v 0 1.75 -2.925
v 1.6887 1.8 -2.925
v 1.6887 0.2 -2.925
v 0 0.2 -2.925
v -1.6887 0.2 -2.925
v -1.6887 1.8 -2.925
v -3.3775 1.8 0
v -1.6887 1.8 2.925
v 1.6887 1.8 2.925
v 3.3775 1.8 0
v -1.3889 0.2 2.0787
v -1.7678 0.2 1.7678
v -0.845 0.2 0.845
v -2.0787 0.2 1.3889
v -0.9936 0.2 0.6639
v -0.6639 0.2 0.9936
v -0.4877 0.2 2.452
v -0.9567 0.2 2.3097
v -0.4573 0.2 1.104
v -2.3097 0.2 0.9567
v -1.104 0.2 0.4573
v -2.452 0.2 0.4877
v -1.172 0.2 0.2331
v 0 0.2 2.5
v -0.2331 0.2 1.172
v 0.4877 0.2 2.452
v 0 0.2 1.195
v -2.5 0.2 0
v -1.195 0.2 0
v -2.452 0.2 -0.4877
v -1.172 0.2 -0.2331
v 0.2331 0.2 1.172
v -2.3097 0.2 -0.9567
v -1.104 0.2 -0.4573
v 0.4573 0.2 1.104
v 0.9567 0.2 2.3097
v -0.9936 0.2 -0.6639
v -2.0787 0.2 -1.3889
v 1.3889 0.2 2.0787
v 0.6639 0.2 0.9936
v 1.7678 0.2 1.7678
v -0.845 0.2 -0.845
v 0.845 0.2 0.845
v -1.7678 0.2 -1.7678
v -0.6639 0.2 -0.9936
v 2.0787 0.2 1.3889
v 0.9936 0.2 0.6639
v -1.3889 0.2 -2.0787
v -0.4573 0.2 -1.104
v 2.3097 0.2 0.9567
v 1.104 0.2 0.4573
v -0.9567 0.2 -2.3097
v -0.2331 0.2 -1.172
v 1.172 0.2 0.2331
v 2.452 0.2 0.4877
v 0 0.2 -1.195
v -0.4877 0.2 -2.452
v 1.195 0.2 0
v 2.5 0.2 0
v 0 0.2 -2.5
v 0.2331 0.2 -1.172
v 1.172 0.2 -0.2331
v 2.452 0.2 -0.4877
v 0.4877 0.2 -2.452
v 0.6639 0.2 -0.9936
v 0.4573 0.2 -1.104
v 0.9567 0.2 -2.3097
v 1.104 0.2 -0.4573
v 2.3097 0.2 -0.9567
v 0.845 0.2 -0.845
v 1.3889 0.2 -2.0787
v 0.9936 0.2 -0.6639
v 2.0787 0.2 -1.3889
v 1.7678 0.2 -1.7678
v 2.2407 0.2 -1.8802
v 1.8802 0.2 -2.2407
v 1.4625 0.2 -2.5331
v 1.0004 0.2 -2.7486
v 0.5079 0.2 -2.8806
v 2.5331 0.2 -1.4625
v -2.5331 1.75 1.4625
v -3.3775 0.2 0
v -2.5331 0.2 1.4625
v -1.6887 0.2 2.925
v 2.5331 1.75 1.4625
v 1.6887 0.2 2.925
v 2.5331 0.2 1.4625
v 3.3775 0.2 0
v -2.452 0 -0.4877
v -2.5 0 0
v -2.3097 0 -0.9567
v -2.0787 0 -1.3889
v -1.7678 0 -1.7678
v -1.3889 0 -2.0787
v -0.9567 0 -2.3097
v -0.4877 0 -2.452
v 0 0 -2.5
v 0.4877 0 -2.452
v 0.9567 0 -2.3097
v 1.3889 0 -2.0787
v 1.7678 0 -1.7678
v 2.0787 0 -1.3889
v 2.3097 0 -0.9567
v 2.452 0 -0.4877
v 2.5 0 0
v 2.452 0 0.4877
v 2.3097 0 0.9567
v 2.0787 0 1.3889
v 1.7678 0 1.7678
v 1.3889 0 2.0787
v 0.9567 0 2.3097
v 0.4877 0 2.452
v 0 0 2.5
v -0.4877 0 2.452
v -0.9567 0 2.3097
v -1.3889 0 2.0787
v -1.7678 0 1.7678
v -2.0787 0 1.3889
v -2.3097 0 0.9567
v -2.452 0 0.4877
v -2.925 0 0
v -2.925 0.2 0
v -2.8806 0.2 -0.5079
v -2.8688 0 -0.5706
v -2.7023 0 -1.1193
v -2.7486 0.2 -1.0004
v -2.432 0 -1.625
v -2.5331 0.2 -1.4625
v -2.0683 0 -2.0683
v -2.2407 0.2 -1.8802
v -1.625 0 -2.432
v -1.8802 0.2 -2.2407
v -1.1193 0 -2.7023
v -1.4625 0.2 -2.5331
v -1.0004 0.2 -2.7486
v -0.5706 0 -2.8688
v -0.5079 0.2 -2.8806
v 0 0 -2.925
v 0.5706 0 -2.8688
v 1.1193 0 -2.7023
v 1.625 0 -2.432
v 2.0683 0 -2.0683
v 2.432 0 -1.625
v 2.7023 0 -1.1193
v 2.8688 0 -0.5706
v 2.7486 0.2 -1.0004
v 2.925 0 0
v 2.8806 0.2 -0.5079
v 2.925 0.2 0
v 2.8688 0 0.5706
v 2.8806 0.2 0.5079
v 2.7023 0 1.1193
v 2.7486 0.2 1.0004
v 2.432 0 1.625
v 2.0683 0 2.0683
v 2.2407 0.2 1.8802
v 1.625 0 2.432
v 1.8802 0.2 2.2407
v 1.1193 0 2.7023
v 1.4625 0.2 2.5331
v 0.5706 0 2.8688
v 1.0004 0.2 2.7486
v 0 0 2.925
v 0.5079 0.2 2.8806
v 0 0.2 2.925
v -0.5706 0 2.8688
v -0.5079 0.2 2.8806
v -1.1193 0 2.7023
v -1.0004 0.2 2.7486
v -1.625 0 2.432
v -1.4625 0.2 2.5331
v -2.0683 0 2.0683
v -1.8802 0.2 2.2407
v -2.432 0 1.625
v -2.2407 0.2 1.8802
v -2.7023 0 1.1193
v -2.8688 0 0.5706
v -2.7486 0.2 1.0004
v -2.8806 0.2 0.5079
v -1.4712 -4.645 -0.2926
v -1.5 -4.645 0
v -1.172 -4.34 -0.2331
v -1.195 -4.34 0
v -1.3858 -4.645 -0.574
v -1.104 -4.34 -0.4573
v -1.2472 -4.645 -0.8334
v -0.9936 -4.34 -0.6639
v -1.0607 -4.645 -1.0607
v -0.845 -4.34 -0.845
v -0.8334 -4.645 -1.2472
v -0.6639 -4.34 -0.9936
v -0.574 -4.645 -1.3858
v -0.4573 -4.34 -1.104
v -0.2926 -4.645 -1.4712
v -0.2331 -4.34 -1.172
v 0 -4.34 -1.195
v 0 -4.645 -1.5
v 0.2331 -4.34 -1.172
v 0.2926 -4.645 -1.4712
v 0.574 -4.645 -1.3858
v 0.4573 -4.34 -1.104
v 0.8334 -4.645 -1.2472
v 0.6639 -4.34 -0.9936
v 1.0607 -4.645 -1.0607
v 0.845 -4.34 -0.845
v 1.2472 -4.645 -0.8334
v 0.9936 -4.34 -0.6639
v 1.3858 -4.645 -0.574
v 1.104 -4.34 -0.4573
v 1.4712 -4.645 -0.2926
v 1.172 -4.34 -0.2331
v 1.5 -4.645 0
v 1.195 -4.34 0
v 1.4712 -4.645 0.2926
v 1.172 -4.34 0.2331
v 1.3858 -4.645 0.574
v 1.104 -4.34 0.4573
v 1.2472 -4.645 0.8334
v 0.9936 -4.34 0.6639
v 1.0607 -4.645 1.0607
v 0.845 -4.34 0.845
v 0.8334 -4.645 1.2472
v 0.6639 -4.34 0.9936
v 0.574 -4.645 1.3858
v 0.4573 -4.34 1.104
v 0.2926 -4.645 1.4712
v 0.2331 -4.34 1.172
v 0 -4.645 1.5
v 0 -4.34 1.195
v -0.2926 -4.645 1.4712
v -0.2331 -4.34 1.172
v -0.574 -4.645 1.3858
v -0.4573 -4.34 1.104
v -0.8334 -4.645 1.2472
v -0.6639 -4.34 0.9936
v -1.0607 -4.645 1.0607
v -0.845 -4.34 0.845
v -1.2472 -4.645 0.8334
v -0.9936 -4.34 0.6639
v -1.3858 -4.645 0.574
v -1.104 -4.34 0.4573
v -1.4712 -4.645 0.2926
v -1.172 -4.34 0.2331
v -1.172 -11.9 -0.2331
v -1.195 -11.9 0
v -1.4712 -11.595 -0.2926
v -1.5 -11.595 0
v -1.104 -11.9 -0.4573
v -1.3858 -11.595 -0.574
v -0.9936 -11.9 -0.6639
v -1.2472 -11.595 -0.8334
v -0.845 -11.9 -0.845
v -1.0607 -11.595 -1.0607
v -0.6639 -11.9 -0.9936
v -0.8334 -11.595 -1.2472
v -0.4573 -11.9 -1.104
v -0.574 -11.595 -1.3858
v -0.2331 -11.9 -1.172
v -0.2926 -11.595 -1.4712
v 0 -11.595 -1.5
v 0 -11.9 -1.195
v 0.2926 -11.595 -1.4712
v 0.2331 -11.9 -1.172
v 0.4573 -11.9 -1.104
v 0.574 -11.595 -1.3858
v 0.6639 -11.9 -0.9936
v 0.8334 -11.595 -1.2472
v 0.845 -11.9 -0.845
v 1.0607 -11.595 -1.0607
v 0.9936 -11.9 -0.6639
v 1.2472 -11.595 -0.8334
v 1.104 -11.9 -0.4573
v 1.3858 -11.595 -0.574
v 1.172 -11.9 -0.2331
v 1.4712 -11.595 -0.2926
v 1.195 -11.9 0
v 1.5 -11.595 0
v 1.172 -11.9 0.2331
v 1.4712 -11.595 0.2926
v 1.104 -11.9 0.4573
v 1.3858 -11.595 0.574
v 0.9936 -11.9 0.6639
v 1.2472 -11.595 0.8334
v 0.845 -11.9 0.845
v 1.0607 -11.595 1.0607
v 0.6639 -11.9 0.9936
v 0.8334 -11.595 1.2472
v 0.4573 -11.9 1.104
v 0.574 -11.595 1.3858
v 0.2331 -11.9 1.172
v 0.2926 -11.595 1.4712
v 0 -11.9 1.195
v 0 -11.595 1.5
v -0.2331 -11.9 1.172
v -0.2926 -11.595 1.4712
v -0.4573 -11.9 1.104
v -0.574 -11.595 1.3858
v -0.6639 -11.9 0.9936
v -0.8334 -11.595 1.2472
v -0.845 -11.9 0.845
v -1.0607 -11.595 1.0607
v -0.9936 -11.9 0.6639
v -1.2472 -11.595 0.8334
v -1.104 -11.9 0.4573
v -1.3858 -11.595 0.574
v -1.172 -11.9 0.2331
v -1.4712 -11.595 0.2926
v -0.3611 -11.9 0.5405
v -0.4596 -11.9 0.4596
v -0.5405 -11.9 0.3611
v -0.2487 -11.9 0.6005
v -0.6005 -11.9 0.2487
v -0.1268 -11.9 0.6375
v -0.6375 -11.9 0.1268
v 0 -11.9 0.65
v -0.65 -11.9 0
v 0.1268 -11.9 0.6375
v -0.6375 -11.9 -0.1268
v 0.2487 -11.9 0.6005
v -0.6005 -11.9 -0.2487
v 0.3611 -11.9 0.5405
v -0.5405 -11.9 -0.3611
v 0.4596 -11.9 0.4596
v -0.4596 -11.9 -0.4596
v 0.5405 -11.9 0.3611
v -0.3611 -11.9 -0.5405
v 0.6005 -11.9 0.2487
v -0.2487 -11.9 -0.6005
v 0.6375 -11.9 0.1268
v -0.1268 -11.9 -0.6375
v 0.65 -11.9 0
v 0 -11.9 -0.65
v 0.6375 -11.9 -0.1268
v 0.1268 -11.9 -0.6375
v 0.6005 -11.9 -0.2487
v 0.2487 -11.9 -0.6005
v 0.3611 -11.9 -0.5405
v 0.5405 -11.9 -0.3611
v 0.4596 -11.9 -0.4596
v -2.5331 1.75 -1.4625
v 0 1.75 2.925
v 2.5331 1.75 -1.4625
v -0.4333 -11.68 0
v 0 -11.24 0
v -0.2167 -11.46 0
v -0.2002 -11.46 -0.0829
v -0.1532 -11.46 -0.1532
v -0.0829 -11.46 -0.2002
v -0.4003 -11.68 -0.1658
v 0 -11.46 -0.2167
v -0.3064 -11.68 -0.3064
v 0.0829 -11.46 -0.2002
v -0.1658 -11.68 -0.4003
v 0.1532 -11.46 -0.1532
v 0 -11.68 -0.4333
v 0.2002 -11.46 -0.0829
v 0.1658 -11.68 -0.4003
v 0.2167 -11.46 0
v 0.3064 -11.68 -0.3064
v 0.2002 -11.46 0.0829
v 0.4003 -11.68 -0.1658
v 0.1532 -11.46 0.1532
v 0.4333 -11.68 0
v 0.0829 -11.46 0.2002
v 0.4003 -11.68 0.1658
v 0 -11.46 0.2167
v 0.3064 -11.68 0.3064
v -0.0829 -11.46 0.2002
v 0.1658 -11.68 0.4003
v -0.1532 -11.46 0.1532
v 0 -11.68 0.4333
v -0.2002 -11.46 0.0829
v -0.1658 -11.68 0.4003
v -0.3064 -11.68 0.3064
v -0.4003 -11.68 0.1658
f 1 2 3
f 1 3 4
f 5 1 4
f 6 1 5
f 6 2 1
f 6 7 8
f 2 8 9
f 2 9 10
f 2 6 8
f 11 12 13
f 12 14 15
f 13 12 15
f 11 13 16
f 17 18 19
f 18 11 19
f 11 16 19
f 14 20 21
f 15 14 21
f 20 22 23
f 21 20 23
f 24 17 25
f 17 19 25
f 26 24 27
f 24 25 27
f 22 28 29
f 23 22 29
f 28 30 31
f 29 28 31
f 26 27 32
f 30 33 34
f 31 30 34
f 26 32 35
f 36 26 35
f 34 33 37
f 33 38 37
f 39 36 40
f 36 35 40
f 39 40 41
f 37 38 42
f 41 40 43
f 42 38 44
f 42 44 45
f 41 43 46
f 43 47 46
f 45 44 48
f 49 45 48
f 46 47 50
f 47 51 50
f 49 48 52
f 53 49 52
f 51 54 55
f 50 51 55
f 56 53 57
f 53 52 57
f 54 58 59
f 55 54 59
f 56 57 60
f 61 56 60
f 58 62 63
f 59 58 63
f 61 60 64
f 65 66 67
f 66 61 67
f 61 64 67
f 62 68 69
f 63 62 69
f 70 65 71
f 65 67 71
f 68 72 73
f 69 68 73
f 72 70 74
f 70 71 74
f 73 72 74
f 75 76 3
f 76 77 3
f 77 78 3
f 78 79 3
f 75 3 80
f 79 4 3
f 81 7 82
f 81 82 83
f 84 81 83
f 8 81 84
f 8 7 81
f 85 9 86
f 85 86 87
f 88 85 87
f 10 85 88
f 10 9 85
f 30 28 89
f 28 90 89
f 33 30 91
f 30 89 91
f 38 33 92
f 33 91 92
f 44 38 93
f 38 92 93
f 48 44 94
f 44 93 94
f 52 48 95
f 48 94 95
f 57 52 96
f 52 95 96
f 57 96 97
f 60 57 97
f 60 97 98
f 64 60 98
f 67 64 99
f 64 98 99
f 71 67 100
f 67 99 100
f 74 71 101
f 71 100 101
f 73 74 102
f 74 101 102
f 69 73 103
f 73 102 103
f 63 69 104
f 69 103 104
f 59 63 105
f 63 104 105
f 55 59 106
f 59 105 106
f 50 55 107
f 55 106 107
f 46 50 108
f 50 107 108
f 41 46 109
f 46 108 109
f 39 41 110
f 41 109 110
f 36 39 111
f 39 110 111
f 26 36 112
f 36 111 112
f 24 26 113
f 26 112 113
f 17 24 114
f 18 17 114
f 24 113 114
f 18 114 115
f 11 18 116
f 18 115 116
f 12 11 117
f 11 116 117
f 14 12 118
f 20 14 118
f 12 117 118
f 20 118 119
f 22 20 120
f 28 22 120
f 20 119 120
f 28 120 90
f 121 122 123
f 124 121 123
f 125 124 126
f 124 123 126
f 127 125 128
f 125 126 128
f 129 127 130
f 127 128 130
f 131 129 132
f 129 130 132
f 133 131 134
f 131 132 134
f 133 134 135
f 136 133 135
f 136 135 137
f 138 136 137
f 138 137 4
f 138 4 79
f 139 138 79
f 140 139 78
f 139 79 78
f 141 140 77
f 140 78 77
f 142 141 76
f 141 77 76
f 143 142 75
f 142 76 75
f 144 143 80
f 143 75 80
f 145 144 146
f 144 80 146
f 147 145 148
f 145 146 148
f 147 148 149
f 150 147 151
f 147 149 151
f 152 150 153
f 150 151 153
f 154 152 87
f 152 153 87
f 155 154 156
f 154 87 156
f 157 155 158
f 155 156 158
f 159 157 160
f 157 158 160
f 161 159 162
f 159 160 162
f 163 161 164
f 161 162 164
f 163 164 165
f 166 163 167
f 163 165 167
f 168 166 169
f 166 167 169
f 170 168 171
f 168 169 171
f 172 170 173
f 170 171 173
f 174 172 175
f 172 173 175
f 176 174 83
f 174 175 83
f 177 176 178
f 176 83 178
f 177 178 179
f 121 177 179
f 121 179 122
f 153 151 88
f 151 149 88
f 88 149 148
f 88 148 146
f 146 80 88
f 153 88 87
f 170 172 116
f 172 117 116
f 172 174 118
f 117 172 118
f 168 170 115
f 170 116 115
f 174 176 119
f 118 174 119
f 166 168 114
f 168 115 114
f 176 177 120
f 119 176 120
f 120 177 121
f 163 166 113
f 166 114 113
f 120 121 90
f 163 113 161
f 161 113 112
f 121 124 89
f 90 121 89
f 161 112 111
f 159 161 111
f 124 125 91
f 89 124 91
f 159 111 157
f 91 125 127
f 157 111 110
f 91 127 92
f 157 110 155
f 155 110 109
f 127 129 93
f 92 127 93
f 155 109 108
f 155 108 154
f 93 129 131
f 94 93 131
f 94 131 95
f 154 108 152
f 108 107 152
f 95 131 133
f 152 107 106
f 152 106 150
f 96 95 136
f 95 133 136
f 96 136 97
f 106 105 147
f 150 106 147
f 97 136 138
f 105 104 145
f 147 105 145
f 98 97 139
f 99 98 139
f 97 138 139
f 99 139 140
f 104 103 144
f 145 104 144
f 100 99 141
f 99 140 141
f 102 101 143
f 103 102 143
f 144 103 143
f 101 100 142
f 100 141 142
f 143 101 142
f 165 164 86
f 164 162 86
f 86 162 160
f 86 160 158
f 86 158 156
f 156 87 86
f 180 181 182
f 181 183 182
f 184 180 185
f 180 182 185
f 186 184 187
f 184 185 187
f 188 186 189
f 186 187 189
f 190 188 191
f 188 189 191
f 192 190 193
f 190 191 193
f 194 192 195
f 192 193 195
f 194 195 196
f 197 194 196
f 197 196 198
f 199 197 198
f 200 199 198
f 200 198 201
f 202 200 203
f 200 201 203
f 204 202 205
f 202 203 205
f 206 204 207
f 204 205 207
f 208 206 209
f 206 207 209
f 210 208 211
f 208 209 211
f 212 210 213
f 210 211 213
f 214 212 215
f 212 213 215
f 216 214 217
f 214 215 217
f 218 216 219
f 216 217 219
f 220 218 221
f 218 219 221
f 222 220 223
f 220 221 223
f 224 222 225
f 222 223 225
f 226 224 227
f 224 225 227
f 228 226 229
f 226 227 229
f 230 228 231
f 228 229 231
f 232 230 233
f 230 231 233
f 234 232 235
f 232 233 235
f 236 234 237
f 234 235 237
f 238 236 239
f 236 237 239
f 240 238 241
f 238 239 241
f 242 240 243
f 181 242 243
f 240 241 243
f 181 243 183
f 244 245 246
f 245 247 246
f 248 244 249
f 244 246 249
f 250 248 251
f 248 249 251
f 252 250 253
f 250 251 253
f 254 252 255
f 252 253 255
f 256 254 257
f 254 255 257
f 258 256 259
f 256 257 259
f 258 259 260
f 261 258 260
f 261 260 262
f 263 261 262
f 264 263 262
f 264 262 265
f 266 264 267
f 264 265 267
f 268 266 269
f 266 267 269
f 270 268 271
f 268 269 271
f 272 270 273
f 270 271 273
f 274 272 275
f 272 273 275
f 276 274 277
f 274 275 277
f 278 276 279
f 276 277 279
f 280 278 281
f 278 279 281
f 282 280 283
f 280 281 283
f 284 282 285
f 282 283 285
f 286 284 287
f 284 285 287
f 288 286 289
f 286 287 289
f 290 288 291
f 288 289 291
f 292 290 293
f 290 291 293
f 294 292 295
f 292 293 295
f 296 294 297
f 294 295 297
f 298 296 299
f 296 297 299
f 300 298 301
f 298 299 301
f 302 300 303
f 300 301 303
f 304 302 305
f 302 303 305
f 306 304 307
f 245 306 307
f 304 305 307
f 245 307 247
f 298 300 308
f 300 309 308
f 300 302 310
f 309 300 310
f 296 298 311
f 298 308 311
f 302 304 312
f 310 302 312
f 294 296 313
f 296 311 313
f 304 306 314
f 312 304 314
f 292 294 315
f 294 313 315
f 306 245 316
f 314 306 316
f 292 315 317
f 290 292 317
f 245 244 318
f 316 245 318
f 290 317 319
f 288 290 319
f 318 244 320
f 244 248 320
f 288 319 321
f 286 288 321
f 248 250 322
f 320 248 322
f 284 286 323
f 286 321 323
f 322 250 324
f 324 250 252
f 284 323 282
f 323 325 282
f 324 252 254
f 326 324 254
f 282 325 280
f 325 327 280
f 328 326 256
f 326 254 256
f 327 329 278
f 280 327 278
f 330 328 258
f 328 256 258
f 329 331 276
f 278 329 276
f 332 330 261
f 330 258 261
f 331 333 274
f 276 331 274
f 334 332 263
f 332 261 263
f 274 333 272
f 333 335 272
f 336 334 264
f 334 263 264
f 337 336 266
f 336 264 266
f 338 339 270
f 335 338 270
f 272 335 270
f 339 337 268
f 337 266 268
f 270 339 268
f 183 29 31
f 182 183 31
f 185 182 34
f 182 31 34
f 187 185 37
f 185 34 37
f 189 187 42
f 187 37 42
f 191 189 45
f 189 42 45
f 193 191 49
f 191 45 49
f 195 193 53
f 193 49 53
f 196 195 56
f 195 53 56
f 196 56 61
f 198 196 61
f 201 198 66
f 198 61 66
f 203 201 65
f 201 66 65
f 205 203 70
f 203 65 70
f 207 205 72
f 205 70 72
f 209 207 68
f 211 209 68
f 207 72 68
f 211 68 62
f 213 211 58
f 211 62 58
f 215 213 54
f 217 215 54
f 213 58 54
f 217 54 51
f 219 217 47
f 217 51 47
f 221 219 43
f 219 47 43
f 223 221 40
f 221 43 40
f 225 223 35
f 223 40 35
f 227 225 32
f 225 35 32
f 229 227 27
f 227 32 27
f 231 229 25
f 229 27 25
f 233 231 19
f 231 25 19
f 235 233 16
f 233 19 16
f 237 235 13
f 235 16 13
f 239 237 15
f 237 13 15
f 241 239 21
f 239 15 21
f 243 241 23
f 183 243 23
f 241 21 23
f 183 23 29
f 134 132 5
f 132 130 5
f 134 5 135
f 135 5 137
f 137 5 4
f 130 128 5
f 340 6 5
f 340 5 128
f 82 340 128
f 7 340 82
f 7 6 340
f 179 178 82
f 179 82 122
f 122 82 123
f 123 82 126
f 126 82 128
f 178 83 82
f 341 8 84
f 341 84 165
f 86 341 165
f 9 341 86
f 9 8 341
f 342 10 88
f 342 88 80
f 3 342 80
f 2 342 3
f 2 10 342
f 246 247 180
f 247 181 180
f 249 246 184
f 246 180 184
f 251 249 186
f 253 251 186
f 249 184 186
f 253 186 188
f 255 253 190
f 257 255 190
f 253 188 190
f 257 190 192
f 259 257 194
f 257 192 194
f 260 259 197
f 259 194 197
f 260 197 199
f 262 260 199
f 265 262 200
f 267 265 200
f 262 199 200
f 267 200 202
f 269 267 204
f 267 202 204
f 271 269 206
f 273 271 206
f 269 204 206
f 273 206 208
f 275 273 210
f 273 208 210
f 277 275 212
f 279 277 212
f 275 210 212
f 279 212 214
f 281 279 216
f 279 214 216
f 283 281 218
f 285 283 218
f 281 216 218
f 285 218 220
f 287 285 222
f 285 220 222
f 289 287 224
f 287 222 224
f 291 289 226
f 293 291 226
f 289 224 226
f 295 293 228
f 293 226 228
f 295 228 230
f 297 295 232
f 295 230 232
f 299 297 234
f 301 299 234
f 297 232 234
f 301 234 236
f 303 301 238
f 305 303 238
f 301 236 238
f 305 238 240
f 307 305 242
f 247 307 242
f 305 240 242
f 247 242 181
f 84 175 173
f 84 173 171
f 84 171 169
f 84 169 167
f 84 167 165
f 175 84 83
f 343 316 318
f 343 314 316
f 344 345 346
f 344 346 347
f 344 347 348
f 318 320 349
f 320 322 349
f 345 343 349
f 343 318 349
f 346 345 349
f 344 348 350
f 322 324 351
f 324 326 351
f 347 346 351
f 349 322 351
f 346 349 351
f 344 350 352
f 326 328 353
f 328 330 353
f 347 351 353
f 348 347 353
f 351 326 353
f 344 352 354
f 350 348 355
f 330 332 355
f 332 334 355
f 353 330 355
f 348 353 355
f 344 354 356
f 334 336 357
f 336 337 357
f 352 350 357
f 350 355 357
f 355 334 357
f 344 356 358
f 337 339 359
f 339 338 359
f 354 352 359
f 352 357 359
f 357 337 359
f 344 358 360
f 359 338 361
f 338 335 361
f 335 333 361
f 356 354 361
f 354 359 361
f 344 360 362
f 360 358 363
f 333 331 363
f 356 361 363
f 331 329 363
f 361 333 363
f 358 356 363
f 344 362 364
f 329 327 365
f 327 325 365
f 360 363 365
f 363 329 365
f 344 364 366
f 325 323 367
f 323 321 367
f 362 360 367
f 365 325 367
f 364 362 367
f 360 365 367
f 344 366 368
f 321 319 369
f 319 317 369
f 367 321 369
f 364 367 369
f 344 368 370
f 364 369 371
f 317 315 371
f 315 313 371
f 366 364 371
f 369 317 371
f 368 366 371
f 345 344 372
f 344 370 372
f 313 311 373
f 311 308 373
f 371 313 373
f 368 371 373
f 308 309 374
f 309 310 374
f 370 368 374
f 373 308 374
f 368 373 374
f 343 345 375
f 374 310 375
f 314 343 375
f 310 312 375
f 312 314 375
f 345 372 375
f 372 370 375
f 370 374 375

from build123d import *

# Parameters (mm, degrees)
BOSS_EXTRUDE1_DEPTH = 1.6


with BuildPart() as part:
    # Эскиз1 → Повернуть1 (revolve)
    with BuildSketch(Plane.XY):
        Polygon((-2.875, 1.8), (0, 1.8), (0, -11.24), (-0.65, -11.9), (-1.195, -11.9), (-1.5, -11.595), (-1.5, -4.645), (-1.195, -4.34), (-1.195, 1), (-2.5, 1), (-2.5, 0), (-2.925, 0), (-2.925, 1.75), align=None)
    revolve(axis=Axis((0, 0, 0), (0, -1, 0)))

    # Sketch1 → Boss-Extrude1 (add)
    with BuildSketch(Plane(origin=(0, 1.8, 0), x_dir=(1, 0, 0), z_dir=(0, 1, 0))):
        Polygon((1.688749537, 2.925), (-1.688749537, 2.925), (-3.377499075, 0), (-1.688749537, -2.925), (1.688749537, -2.925), (3.377499075, 0), align=None)
    extrude(amount=-BOSS_EXTRUDE1_DEPTH)


solid = part.part
